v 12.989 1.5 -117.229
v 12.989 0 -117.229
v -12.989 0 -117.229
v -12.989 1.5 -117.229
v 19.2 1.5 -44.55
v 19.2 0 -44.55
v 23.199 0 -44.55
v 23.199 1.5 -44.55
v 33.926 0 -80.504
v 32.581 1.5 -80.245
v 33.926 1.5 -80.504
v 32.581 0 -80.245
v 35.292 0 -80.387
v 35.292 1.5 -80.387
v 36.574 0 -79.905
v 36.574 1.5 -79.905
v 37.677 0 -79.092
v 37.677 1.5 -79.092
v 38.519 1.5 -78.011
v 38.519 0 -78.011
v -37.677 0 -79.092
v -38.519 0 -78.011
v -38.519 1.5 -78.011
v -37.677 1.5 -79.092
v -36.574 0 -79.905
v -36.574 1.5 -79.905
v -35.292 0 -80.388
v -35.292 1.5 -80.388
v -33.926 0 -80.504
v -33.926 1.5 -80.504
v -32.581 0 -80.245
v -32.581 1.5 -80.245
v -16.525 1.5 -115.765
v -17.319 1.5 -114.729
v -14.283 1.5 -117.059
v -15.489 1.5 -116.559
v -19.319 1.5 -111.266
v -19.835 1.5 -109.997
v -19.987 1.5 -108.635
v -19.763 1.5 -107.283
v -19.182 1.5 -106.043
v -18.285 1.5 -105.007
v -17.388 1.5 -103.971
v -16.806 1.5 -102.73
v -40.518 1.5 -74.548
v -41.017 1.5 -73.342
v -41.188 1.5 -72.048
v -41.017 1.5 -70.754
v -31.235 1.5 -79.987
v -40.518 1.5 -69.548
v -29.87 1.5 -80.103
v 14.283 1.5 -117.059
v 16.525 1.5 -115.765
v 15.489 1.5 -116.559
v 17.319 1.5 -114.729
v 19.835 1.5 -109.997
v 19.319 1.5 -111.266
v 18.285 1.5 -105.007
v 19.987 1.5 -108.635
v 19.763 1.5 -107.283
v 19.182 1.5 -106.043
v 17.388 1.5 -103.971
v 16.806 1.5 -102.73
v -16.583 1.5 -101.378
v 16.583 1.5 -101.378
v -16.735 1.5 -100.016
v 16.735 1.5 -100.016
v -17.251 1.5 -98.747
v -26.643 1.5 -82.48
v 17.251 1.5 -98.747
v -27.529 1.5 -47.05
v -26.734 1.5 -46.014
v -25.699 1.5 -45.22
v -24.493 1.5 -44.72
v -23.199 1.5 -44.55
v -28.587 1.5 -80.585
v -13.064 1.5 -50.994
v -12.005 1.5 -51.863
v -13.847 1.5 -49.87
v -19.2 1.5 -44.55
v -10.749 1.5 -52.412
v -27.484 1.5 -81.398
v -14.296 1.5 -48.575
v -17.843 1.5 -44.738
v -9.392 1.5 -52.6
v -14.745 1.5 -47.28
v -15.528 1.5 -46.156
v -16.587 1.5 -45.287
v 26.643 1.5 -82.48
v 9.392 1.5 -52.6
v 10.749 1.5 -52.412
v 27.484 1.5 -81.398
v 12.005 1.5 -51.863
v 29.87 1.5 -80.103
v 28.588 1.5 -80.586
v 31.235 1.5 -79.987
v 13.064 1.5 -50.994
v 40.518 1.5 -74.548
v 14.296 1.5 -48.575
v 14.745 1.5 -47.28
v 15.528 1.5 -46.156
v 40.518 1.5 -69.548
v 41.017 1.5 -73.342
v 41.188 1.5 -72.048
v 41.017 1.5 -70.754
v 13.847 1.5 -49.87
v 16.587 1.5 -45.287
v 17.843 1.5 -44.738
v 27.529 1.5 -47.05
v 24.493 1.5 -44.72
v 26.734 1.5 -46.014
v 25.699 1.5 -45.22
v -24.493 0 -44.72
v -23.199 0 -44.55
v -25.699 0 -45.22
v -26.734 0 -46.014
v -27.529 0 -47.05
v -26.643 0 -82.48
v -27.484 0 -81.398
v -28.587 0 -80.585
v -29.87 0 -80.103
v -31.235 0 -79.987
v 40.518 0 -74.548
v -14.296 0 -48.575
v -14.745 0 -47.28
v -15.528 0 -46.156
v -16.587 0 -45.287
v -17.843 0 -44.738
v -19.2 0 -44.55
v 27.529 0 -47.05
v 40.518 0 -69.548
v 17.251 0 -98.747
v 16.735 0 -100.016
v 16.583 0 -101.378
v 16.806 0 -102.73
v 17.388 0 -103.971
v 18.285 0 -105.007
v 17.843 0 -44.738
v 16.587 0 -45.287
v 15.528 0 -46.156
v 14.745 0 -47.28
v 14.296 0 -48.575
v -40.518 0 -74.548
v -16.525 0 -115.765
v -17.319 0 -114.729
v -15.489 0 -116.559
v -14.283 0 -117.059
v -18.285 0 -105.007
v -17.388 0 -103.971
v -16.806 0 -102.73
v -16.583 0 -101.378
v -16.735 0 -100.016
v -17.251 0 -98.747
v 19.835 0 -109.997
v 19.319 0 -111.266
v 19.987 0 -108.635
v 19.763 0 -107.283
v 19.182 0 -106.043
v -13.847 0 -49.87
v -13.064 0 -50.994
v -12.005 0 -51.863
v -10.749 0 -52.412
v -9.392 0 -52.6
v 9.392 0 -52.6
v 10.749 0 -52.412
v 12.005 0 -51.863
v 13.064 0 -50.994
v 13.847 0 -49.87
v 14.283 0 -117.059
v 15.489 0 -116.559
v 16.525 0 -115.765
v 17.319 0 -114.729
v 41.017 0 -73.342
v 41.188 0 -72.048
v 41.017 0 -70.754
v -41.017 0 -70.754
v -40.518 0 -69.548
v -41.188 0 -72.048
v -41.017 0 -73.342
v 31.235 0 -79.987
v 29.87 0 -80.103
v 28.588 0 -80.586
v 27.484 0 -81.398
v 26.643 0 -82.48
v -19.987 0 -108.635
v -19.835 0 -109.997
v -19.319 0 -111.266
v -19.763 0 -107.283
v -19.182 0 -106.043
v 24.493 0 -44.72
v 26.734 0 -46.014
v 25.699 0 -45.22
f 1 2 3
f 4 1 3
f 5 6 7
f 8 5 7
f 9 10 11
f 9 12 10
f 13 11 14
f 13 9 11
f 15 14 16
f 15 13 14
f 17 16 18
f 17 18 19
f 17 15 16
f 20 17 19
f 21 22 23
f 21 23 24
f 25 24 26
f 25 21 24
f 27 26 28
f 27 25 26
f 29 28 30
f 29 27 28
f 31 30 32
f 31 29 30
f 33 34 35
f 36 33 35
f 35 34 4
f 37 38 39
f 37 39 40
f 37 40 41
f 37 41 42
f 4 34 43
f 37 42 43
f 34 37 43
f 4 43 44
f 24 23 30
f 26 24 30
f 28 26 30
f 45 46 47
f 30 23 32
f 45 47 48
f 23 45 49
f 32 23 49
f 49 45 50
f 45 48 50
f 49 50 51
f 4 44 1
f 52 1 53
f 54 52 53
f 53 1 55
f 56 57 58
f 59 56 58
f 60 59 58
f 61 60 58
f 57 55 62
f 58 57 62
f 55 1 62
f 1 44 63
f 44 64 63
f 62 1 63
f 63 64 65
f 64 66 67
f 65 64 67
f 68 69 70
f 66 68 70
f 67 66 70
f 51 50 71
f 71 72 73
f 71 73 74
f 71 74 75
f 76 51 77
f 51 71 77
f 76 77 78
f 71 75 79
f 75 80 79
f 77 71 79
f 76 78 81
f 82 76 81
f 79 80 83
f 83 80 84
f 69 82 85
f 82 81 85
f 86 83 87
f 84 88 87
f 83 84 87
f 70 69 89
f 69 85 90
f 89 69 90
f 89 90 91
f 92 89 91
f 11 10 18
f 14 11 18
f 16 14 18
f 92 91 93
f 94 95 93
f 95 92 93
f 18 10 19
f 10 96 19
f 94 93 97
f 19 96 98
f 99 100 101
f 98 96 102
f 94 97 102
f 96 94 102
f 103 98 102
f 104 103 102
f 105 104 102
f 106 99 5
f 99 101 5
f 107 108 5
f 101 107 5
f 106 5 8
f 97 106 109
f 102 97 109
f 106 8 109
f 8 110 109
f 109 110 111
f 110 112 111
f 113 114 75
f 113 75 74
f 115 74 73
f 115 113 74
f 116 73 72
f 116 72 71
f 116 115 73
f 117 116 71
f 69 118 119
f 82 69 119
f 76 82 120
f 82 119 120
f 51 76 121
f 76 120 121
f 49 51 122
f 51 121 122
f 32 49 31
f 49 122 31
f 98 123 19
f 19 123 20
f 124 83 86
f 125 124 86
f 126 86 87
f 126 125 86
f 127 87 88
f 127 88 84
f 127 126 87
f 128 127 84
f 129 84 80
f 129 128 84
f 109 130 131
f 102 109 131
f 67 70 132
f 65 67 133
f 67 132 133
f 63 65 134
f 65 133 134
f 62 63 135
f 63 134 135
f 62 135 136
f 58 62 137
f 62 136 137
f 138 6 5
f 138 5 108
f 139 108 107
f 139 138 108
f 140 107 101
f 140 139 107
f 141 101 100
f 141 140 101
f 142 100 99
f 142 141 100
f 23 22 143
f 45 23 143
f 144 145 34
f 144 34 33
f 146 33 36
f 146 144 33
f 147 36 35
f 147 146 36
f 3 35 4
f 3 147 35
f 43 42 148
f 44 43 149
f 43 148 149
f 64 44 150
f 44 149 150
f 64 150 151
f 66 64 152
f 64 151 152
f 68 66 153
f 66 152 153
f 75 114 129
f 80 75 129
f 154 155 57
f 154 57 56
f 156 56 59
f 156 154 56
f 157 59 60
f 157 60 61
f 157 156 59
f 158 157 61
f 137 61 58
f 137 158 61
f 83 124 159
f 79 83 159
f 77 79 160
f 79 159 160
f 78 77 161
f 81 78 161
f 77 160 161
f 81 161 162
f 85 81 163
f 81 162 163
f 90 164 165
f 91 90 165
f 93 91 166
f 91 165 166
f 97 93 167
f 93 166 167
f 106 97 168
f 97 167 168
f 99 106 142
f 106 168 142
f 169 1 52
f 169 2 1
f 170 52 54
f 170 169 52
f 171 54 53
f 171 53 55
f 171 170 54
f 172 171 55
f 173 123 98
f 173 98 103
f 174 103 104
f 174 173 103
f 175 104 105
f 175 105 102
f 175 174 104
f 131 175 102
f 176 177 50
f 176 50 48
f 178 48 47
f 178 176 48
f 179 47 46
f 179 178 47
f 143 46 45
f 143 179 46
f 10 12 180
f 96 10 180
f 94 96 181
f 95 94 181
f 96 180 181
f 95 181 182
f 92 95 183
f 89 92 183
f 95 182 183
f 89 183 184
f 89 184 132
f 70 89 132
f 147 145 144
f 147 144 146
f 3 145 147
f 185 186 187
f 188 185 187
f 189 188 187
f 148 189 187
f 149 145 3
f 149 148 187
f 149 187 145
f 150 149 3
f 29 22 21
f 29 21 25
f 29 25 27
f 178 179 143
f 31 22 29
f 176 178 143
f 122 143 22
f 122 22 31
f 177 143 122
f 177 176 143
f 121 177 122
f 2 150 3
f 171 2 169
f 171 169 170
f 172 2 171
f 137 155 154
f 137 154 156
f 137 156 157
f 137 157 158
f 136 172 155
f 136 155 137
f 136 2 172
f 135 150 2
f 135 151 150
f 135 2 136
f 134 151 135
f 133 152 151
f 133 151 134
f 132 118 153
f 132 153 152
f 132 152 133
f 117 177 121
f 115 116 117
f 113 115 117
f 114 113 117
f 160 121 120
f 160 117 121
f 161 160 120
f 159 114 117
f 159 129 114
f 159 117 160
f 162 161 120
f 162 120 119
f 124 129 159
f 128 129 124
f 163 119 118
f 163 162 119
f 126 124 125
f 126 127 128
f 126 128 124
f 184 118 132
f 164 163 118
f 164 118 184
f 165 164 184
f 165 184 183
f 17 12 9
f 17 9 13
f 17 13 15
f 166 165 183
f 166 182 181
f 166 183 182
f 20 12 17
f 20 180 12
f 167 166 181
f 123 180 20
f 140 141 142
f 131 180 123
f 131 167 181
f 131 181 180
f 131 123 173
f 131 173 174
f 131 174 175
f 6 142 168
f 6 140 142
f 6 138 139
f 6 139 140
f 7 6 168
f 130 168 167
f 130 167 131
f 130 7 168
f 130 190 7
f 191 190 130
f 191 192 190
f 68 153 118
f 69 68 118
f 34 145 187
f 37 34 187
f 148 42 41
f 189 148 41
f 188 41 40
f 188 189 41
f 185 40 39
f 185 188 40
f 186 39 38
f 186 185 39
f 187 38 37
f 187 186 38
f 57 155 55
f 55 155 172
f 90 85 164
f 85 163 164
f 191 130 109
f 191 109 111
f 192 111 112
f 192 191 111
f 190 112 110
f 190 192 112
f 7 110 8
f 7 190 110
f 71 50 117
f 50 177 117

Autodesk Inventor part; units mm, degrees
ref_plane "YZ Plane" through (0, 0, 0) normal (1, 0, 0) x (0, 1, 0)
ref_plane "XZ Plane" through (0, 0, 0) normal (0, 1, 0) x (-1, 0, 0)
ref_plane "XY Plane" through (0, 0, 0) normal (0, 0, 1) x (1, 0, 0)
sketch "スケッチ1" plane through (0, 0, 0) normal (0, 1, 0) x (-1, 0, 0)
  line L0 (75, 0) -> (105, -51.9615)
  line L1 (-75, 0) -> (-105, -51.9615)
  line L2 (0, -218.2384) -> (0, 36.3731)
  line L3 (147, 0) -> (-147, 0)
  line L4 (37.5, -27) -> (-37.5, -27)
  line L5 (105, -51.9615) -> (30, -181.8653)
  line L6 (30, -181.8653) -> (-30, -181.8653)
  line L7 (-30, -181.8653) -> (-105, -51.9615)
  line L8 (75, 0) -> (-75, 0)
  line L9 (-25.3673, -135.8894) -> (-62.8673, -70.9375)
  line L10 (25.3673, -135.8894) -> (62.8673, -70.9375)
  line L11 (-37.5, -27) -> (-27.5, -27)
  line L12 (-27.5, -27) -> (-27.5, -39)
  line L13 (-27.5, -39) -> (-37.5, -39)
  line L14 (-37.5, -39) -> (-37.5, -27)
  line L15 (37.5, -27) -> (27.5, -27)
  line L16 (27.5, -27) -> (27.5, -39)
  line L17 (27.5, -39) -> (37.5, -39)
  line L18 (37.5, -39) -> (37.5, -27)
  line L19 (0, -77.9423) -> (44.1173, -103.4134) construction
  line L20 (0, -77.9423) -> (-44.1173, -103.4134) construction
  line L21 (-44.1173, -103.4134) -> (-67.5, -116.9134) construction
  line L22 (-57.8673, -79.5977) -> (-47.475, -73.5977)
  line L23 (-52.475, -64.9375) -> (-62.8673, -70.9375)
  line L24 (-62.8673, -70.9375) -> (-57.8673, -79.5977)
  line L25 (-47.475, -73.5977) -> (-52.475, -64.9375)
  line L26 (-25.3673, -135.8894) -> (-30.3673, -127.2291)
  line L27 (-19.975, -121.2291) -> (-14.975, -129.8894)
  line L28 (-14.975, -129.8894) -> (-25.3673, -135.8894)
  line L29 (-30.3673, -127.2291) -> (-19.975, -121.2291)
  line L30 (30.3673, -127.2291) -> (19.975, -121.2291)
  line L31 (14.975, -129.8894) -> (25.3673, -135.8894)
  line L32 (25.3673, -135.8894) -> (30.3673, -127.2291)
  line L33 (19.975, -121.2291) -> (14.975, -129.8894)
  line L34 (62.8673, -70.9375) -> (57.8673, -79.5977)
  line L35 (47.475, -73.5977) -> (52.475, -64.9375)
  line L36 (52.475, -64.9375) -> (62.8673, -70.9375)
  line L37 (57.8673, -79.5977) -> (47.475, -73.5977)
  line L38 (62.8673, -70.9375) -> (37.5, -27)
  line L39 (-37.5, -27) -> (-62.8673, -70.9375)
  line L40 (-25.3673, -135.8894) -> (25.3673, -135.8894)
  line L41 (-25.3673, -135.8894) -> (-25.3673, -181.8653)
  line L42 (25.3673, -135.8894) -> (25.3673, -181.8653)
  line L43 (-25.3673, -135.8894) -> (-48.75, -149.3894)
  line L44 (25.3673, -135.8894) -> (48.75, -149.3894)
  point P0 (0, 0)
  point P1 (0, 0)
  point P2 (0, -27)
  dimension "d1" = 150
  dimension "d2" = 60
  dimension "d3" = 60
  dimension "d4" = 27
  dimension "d5" = 75
  dimension "d6" = 60
  dimension "d7" = 27
  dimension "d8" = 10
  dimension "d9" = 12
  dimension "d10" = 10
  dimension "d11" = 12
  dimension "d14" = 360
extrude "プレート1" add sketch "スケッチ1" along normal blind 1.5 contours L5 L6 L42 L44 | L4 L16 L17 L18 L38 L36 L35 L37 L10 L30 L33 L31 L40 L2 | L2 L40 L28 L27 L29 L9 L22 L25 L23 L39 L14 L13 L12 L4 | L31 L33 L30 L10 | L42 L6 L2 L40 | L2 L6 L41 L40 | L4 L18 L17 L16 | L12 L13 L14 L4 | L9 L29 L27 L28 | L41 L6 L7 L43 | L37 L35 L36 L10 | L23 L25 L22 L9
sketch "スケッチ2" plane through (0, 0, 0) normal (0, -1, 0) x (1, 0, 0)
  line L0 (23.3798, -38.55) -> (-23.3798, -38.55) projected
  line L1 (8.2, -46.6) -> (-8.2, -46.6) projected
  arc A0 (-21.1, -27) -> (-23.3798, -38.55) centre (-21.1, -33) ccw projected
  line L2 (-27.5, -27) -> (-27.5, -39) projected
  line L3 (27.5, -39) -> (27.5, -27) projected
  line L4 (-27.5, -39) -> (-27.5, -40.55)
  line L5 (-27.5, -40.55) -> (-10.2, -40.55)
  line L6 (-10.2, -40.55) -> (-10.2, -48.6)
  line L7 (-10.2, -48.6) -> (10.2, -48.6)
  line L8 (10.2, -48.6) -> (10.2, -40.55)
  line L9 (10.2, -40.55) -> (27.5, -40.55)
  line L10 (27.5, -40.55) -> (27.5, -39)
  line L11 (-37.5, -27) -> (-27.5, -27) projected
  line L12 (-37.5, -27) -> (37.5, -27) projected
  line L13 (-20.3112, -101.4469) -> (-30.5112, -83.78)
  line L14 (-27.2827, -105.4719) -> (-20.3112, -101.4469)
  line L15 (-18.6327, -120.4541) -> (-27.2827, -105.4719)
  line L16 (-19.975, -121.2291) -> (-18.6327, -120.4541)
  line L17 (-37.4827, -87.805) -> (-46.1327, -72.8227)
  line L18 (-46.1327, -72.8227) -> (-47.475, -73.5977)
  line L19 (-30.5112, -83.78) -> (-37.4827, -87.805)
  line L20 (30.5112, -83.78) -> (20.3112, -101.4469)
  line L21 (37.4827, -87.805) -> (30.5112, -83.78)
  line L22 (46.1327, -72.8227) -> (37.4827, -87.805)
  line L23 (47.475, -73.5977) -> (46.1327, -72.8227)
  line L24 (27.2827, -105.4719) -> (18.6327, -120.4541)
  line L25 (18.6327, -120.4541) -> (19.975, -121.2291)
  line L26 (20.3112, -101.4469) -> (27.2827, -105.4719)
  line L27 (-47.475, -73.5977) -> (-57.8673, -79.5977)
  line L28 (-57.8673, -79.5977) -> (-30.3673, -127.2291)
  line L29 (-30.3673, -127.2291) -> (-19.975, -121.2291)
  line L30 (19.975, -121.2291) -> (30.3673, -127.2291)
  line L31 (30.3673, -127.2291) -> (57.8673, -79.5977)
  line L32 (57.8673, -79.5977) -> (47.475, -73.5977)
  point P0 (0, 0)
  point P1 (0, -77.9423)
  point P2 (-23.0432, -100.7148)
  point P3 (-33.5673, -121.6866)
  point P4 (-22.4248, -117.8859)
  point P5 (-25.3673, -135.8894)
  point P6 (-28.3712, -118.6866)
  point P7 (-31.2432, -86.512)
  point P8 (-45.8046, -77.3909)
  point P9 (-62.8673, -70.9375)
  point P10 (31.2432, -86.512)
  point P11 (54.6673, -85.1403)
  point P12 (45.8046, -77.3909)
  point P13 (62.8673, -70.9375)
  point P14 (49.4712, -82.1403)
  point P15 (23.0432, -100.7148)
  point P16 (22.4248, -117.8859)
  point P17 (25.3673, -135.8894)
  dimension "d17" = 2
  dimension "d18" = 2
  dimension "d19" = 2
  dimension "d20" = 2
  dimension "d26" = 360
extrude "切り取り1" cut sketch "スケッチ2" against normal blind 1.5
fillet "フィレット1" radius 1.5 18 edges at (-10.2, 0.75, -48.6) (-10.2, 0.75, -40.55) (-27.5, 0.75, -40.55) (10.2, 0.75, -48.6) (10.2, 0.75, -40.55) (27.5, 0.75, -40.55) (-30.5112, 0.75, -83.78) (-46.1327, 0.75, -72.8227) (-20.3112, 0.75, -101.4469) (-27.2827, 0.75, -105.4719) (-37.4827, 0.75, -87.805) (-18.6327, 0.75, -120.4541) (20.3112, 0.75, -101.4469) (27.2827, 0.75, -105.4719) (18.6327, 0.75, -120.4541) (30.5112, 0.75, -83.78) (37.4827, 0.75, -87.805) (46.1327, 0.75, -72.8227)
sketch "スケッチ3" plane through (0, 0, 0) normal (0, -1, 0) x (1, 0, 0)
  circle A0 centre (40.9875, -45.0405) radius 1.6 projected
  circle A1 centre (48.9875, -58.8969) radius 1.6 projected
  circle A2 centre (8, -129.8894) radius 1.6 projected
  circle A3 centre (-8, -129.8894) radius 1.6 projected
  circle A4 centre (-48.9875, -58.8969) radius 1.6 projected
  circle A5 centre (-40.9875, -45.0405) radius 1.6 projected
  point P0 (0, 0)
extrude "切り取り2" cut sketch "スケッチ3" against normal blind 1.5
sketch "スケッチ4" plane through (0, 0, 0) normal (0, -1, 0) x (1, 0, 0)
  circle A0 centre (10, -176.8653) radius 1.35 projected
  circle A1 centre (21.2333, -145.0496) radius 1.6 projected
  circle A2 centre (10, -143.8894) radius 1.6 projected
  line L0 (52.75, -142.4612) -> (30, -181.8653) projected
  line L1 (52.75, -142.4612) -> (33.6974, -131.4612) projected
  line L2 (33.6974, -131.4612) -> (27.1974, -142.7195) projected
  line L3 (27.1974, -142.7195) -> (20.5635, -138.8894) projected
  line L4 (20.5635, -138.8894) -> (5, -138.8894) projected
  line L5 (5, -138.8894) -> (5, -181.8653) projected
  line L6 (30, -181.8653) -> (5, -181.8653) projected
  circle A3 centre (-10, -176.8653) radius 1.35 projected
  circle A4 centre (-21.2333, -145.0496) radius 1.6 projected
  circle A5 centre (-10, -143.8894) radius 1.6 projected
  line L7 (-12.9295, -171.4323) -> (-35.4295, -132.4612) projected
  line L8 (-30.25, -181.4323) -> (-12.9295, -171.4323) projected
  line L9 (-30, -181.8653) -> (-30.25, -181.4323) projected
  line L10 (-30, -181.8653) -> (-5, -181.8653) projected
  line L11 (-5, -181.8653) -> (-5, -138.8894) projected
  line L12 (-5, -138.8894) -> (-20.5635, -138.8894) projected
  line L13 (-20.5635, -138.8894) -> (-27.1974, -142.7195) projected
  line L14 (-33.6974, -131.4612) -> (-27.1974, -142.7195) projected
  line L15 (-35.4295, -132.4612) -> (-33.6974, -131.4612) projected
  point P0 (0, 0)
extrude "切り取り3" cut sketch "スケッチ4" against normal blind 1.5 contours A0 | A1 | A2 | A3 | A4 | A5
sketch "スケッチ5" plane through (0, 1.5, 0) normal (0, 1, 0) x (1, 0, 0)
  line L0 (-19.975, 121.2291) -> (19.975, 121.2291) projected
  line L1 (47.475, 73.5977) -> (27.5, 39) projected
  line L2 (-47.475, 73.5977) -> (-27.5, 39) projected
  point P0 (0, 0)
sketch "スケッチ6" plane through (0, 1.5, 0) normal (0, 1, 0) x (1, 0, 0)
  line L0 (-26.0855, 44.55) -> (-41.9613, 72.0477)
  line L1 (-41.9613, 72.0477) -> (-36.0186, 82.3409)
  line L2 (-36.0186, 82.3409) -> (-29.0471, 78.3159)
  line L3 (-29.0471, 78.3159) -> (-14.8471, 102.911)
  line L4 (-14.8471, 102.911) -> (-21.8186, 106.936)
  line L5 (-21.8186, 106.936) -> (-15.8758, 117.2291)
  line L6 (-15.8758, 117.2291) -> (15.8758, 117.2291)
  line L7 (15.8758, 117.2291) -> (21.8186, 106.936)
  line L8 (21.8186, 106.936) -> (14.8471, 102.911)
  line L9 (14.8471, 102.911) -> (29.0471, 78.3159)
  line L10 (29.0471, 78.3159) -> (36.0186, 82.3409)
  line L11 (36.0186, 82.3409) -> (41.9613, 72.0477)
  line L12 (41.9613, 72.0477) -> (26.0855, 44.55)
  line L13 (26.0855, 44.55) -> (14.2, 44.55)
  line L14 (14.2, 44.55) -> (14.2, 52.6)
  line L15 (14.2, 52.6) -> (-14.2, 52.6)
  line L16 (-14.2, 52.6) -> (-14.2, 44.55)
  line L17 (-14.2, 44.55) -> (-26.0855, 44.55)
  line L18 (-47.475, 73.5977) -> (-27.5, 39) projected
  line L19 (-38.2327, 86.5059) -> (-45.3827, 74.1218) projected
  line L20 (-31.8102, 84.53) -> (-36.1836, 87.055) projected
  line L21 (-21.0612, 100.1479) -> (-29.7612, 85.079) projected
  line L22 (-25.9836, 104.7219) -> (-21.6102, 102.1969) projected
  line L23 (-19.3827, 119.1551) -> (-26.5327, 106.7709) projected
  line L24 (-19.975, 121.2291) -> (19.975, 121.2291) projected
  line L25 (47.475, 73.5977) -> (27.5, 39) projected
  line L26 (26.5327, 106.7709) -> (19.3827, 119.1551) projected
  line L27 (21.6102, 102.1969) -> (25.9836, 104.7219) projected
  line L28 (29.7612, 85.079) -> (21.0612, 100.1479) projected
  line L29 (36.1836, 87.055) -> (31.8102, 84.53) projected
  line L30 (45.3827, 74.1218) -> (38.2327, 86.5059) projected
  line L31 (11.7, 40.55) -> (26, 40.55) projected
  line L32 (10.2, 47.1) -> (10.2, 42.05) projected
  line L33 (-8.7, 48.6) -> (8.7, 48.6) projected
  line L34 (-10.2, 42.05) -> (-10.2, 47.1) projected
  line L35 (-26, 40.55) -> (-11.7, 40.55) projected
  line L36 (0, 48.6) -> (0, 121.2291)
  line L37 (-25.4112, 92.6134) -> (-31.0836, 95.8884) construction
  point P0 (0, 0)
  dimension "d32" = 4
  dimension "d33" = 4
  dimension "d34" = 4
  dimension "d35" = 4
  dimension "d36" = 4
  dimension "d37" = 4
  dimension "d38" = 4
  dimension "d39" = 4
  dimension "d40" = 4
extrude "切り取り4" cut sketch "スケッチ6" against normal blind 1.5
fillet "フィレット2" radius 5 9 edges at (-14.2, 0.75, -44.55) (-26.0855, 0.75, -44.55) (-41.9613, 0.75, -72.0477) (-36.0186, 0.75, -82.3409) (-21.8186, 0.75, -106.936) (-15.8758, 0.75, -117.2291) (-14.2, 0.75, -52.6) (-29.0471, 0.75, -78.3159) (-14.8471, 0.75, -102.911)
mirror "ミラー1" about plane through (0, 0, 0) normal (1, 0, 0) of "フィレット2"
sketch "スケッチ7" plane through (0, 0, 0) normal (0, -1, 0) x (1, 0, 0)
  arc A0 (17.2511, -98.7471) -> (18.2848, -105.0066) centre (21.5812, -101.2471) ccw projected
  arc A1 (19.3186, -111.2661) -> (18.2848, -105.0066) centre (14.9884, -108.7661) ccw projected
  line L0 (19.3186, -111.2661) -> (17.3192, -114.7291) projected
  arc A2 (12.9891, -117.2291) -> (17.3192, -114.7291) centre (12.9891, -112.2291) ccw projected
  line L1 (12.9891, -117.2291) -> (-12.9891, -117.2291) projected
  arc A3 (-17.3192, -114.7291) -> (-12.9891, -117.2291) centre (-12.9891, -112.2291) ccw projected
  line L2 (-17.3192, -114.7291) -> (-19.3186, -111.2661) projected
  arc A4 (-18.2848, -105.0066) -> (-19.3186, -111.2661) centre (-14.9884, -108.7661) ccw projected
  arc A5 (-18.2848, -105.0066) -> (-17.2511, -98.7471) centre (-21.5812, -101.2471) ccw projected
  line L3 (-17.2511, -98.7471) -> (-26.643, -82.4797) projected
  arc A6 (-26.643, -82.4797) -> (-32.5808, -80.2452) centre (-30.9732, -84.9797) ccw projected
  arc A7 (-38.5186, -78.0107) -> (-32.5808, -80.2452) centre (-34.1884, -75.5107) ccw projected
  line L4 (-38.5186, -78.0107) -> (-40.5179, -74.5477) projected
  arc A8 (-40.5179, -69.5477) -> (-40.5179, -74.5477) centre (-36.1878, -72.0477) ccw projected
  line L5 (-40.5179, -69.5477) -> (-27.5289, -47.05) projected
  arc A9 (-23.1987, -44.55) -> (-27.5289, -47.05) centre (-23.1987, -49.55) ccw projected
  line L6 (-23.1987, -44.55) -> (-19.2, -44.55) projected
  arc A10 (-14.296, -48.575) -> (-19.2, -44.55) centre (-19.2, -49.55) ccw projected
  arc A11 (-14.296, -48.575) -> (-9.392, -52.6) centre (-9.392, -47.6) ccw projected
  line L7 (-9.392, -52.6) -> (9.392, -52.6) projected
  arc A12 (9.392, -52.6) -> (14.296, -48.575) centre (9.392, -47.6) ccw projected
  arc A13 (19.2, -44.55) -> (14.296, -48.575) centre (19.2, -49.55) ccw projected
  line L8 (19.2, -44.55) -> (23.1987, -44.55) projected
  arc A14 (27.5289, -47.05) -> (23.1987, -44.55) centre (23.1987, -49.55) ccw projected
  line L9 (27.5289, -47.05) -> (40.5179, -69.5477) projected
  arc A15 (40.5179, -74.5477) -> (40.5179, -69.5477) centre (36.1878, -72.0477) ccw projected
  line L10 (40.5179, -74.5477) -> (38.5186, -78.0107) projected
  arc A16 (32.5808, -80.2452) -> (38.5186, -78.0107) centre (34.1884, -75.5107) ccw projected
  arc A17 (32.5808, -80.2452) -> (26.643, -82.4797) centre (30.9732, -84.9797) ccw projected
  line L11 (26.643, -82.4797) -> (17.2511, -98.7471) projected
  circle A18 centre (21.2333, -145.0496) radius 1.6 projected
  circle A19 centre (-10, -143.8894) radius 1.6 projected
  circle A20 centre (-10, -176.8653) radius 1.35 projected
  circle A21 centre (-21.2333, -145.0496) radius 1.6 projected
  circle A22 centre (10, -176.8653) radius 1.35 projected
  circle A23 centre (10, -143.8894) radius 1.6 projected
  circle A24 centre (-48.9875, -58.8969) radius 1.6 projected
  circle A25 centre (8, -129.8894) radius 1.6 projected
  circle A26 centre (40.9875, -45.0405) radius 1.6 projected
  circle A27 centre (48.9875, -58.8969) radius 1.6 projected
  circle A28 centre (-8, -129.8894) radius 1.6 projected
  circle A29 centre (-40.9875, -45.0405) radius 1.6 projected
  arc A30 (36.1836, -87.055) -> (38.2327, -86.5059) centre (36.9336, -85.7559) ccw projected
  line L12 (38.2327, -86.5059) -> (45.3827, -74.1218) projected
  arc A31 (47.4317, -73.5727) -> (45.3827, -74.1218) centre (46.6817, -74.8718) ccw projected
  line L13 (47.4317, -73.5727) -> (57.8673, -79.5977) projected
  line L14 (62.8673, -70.9375) -> (57.8673, -79.5977) projected
  line L15 (37.5, -27) -> (62.8673, -70.9375) projected
  line L16 (27.5, -27) -> (37.5, -27) projected
  line L17 (27.5, -27) -> (27.5, -39.05) projected
  arc A32 (26, -40.55) -> (27.5, -39.05) centre (26, -39.05) ccw projected
  line L18 (26, -40.55) -> (11.7, -40.55) projected
  arc A33 (11.7, -40.55) -> (10.2, -42.05) centre (11.7, -42.05) ccw projected
  line L19 (10.2, -42.05) -> (10.2, -47.1) projected
  arc A34 (8.7, -48.6) -> (10.2, -47.1) centre (8.7, -47.1) ccw projected
  line L20 (8.7, -48.6) -> (-8.7, -48.6) projected
  arc A35 (-10.2, -47.1) -> (-8.7, -48.6) centre (-8.7, -47.1) ccw projected
  line L21 (-10.2, -47.1) -> (-10.2, -42.05) projected
  arc A36 (-10.2, -42.05) -> (-11.7, -40.55) centre (-11.7, -42.05) ccw projected
  line L22 (-11.7, -40.55) -> (-26, -40.55) projected
  arc A37 (-27.5, -39.05) -> (-26, -40.55) centre (-26, -39.05) ccw projected
  line L23 (-27.5, -39.05) -> (-27.5, -27) projected
  line L24 (-37.5, -27) -> (-27.5, -27) projected
  line L25 (-62.8673, -70.9375) -> (-37.5, -27) projected
  line L26 (-57.8673, -79.5977) -> (-62.8673, -70.9375) projected
  line L27 (-57.8673, -79.5977) -> (-47.4317, -73.5727) projected
  arc A38 (-45.3827, -74.1218) -> (-47.4317, -73.5727) centre (-46.6817, -74.8718) ccw projected
  line L28 (-45.3827, -74.1218) -> (-38.2327, -86.5059) projected
  arc A39 (-38.2327, -86.5059) -> (-36.1836, -87.055) centre (-36.9336, -85.7559) ccw projected
  line L29 (-36.1836, -87.055) -> (-31.8102, -84.53) projected
  arc A40 (-29.7612, -85.079) -> (-31.8102, -84.53) centre (-31.0602, -85.829) ccw projected
  line L30 (-29.7612, -85.079) -> (-21.0612, -100.1479) projected
  arc A41 (-21.6102, -102.1969) -> (-21.0612, -100.1479) centre (-22.3602, -100.8979) ccw projected
  line L31 (-21.6102, -102.1969) -> (-25.9836, -104.7219) projected
  arc A42 (-25.9836, -104.7219) -> (-26.5327, -106.7709) centre (-25.2336, -106.0209) ccw projected
  line L32 (-26.5327, -106.7709) -> (-19.3827, -119.1551) projected
  arc A43 (-19.9317, -121.2041) -> (-19.3827, -119.1551) centre (-20.6817, -119.9051) ccw projected
  line L33 (-19.9317, -121.2041) -> (-30.3673, -127.2291) projected
  line L34 (-25.3673, -135.8894) -> (-30.3673, -127.2291) projected
  line L35 (-48.75, -149.3894) -> (-25.3673, -135.8894) projected
  line L36 (-30, -181.8653) -> (-48.75, -149.3894) projected
  line L37 (30, -181.8653) -> (-30, -181.8653) projected
  line L38 (48.75, -149.3894) -> (30, -181.8653) projected
  line L39 (25.3673, -135.8894) -> (48.75, -149.3894) projected
  line L40 (30.3673, -127.2291) -> (25.3673, -135.8894) projected
  line L41 (30.3673, -127.2291) -> (19.9317, -121.2041) projected
  arc A44 (19.3827, -119.1551) -> (19.9317, -121.2041) centre (20.6817, -119.9051) ccw projected
  line L42 (19.3827, -119.1551) -> (26.5327, -106.7709) projected
  arc A45 (26.5327, -106.7709) -> (25.9836, -104.7219) centre (25.2336, -106.0209) ccw projected
  line L43 (25.9836, -104.7219) -> (21.6102, -102.1969) projected
  arc A46 (21.0612, -100.1479) -> (21.6102, -102.1969) centre (22.3602, -100.8979) ccw projected
  line L44 (21.0612, -100.1479) -> (29.7612, -85.079) projected
  arc A47 (31.8102, -84.53) -> (29.7612, -85.079) centre (31.0602, -85.829) ccw projected
  line L45 (31.8102, -84.53) -> (36.1836, -87.055) projected
  point P0 (0, 0)
extrude "押し出し1" cut sketch "スケッチ7" against normal through all
extrude "押し出し2" add sketch "スケッチ7" against normal blind 1.5 contours A0 A1 L0 A2 L1 A3 L2 A4 A5 L3 A6 A7 L4 A8 L5 A9 L6 A10 A11 L7 A12 A13 L8 A14 L9 A15 L10 A16 A17 L11
equation "\"d3\" = d2"
equation "\"d7\" = d4"
equation "\"d19\" = d18"
equation "\"d21\" = Thickness"
equation "\"d28\" = Thickness"
equation "\"d30\" = Thickness"
equation "\"d33\" = d32"
equation "\"d34\" = d32"
equation "\"d35\" = d32"
equation "\"d36\" = d32"
equation "\"d37\" = d32"
equation "\"d38\" = d32"
equation "\"d39\" = d32"
equation "\"d40\" = d32"
equation "\"d41\" = Thickness"
equation "\"d16\" = Thickness"
equation "\"BendRadius\" = Thickness"
equation "\"BendReliefWidth\" = Thickness"
equation "\"BendReliefDepth\" = 0.5 * Thickness"
equation "\"CornerReliefSize\" = 4 * Thickness"
equation "\"MinimumRemnant\" = 2 * Thickness"
equation "\"TransitionRadius\" = BendRadius"
equation "\"JacobiRadiusSize\" = BendRadius"
equation "\"GapSize\" = Thickness"
equation "\"Thickness\" = 1.5"
properties part number "ORCA_CORE_setter"
